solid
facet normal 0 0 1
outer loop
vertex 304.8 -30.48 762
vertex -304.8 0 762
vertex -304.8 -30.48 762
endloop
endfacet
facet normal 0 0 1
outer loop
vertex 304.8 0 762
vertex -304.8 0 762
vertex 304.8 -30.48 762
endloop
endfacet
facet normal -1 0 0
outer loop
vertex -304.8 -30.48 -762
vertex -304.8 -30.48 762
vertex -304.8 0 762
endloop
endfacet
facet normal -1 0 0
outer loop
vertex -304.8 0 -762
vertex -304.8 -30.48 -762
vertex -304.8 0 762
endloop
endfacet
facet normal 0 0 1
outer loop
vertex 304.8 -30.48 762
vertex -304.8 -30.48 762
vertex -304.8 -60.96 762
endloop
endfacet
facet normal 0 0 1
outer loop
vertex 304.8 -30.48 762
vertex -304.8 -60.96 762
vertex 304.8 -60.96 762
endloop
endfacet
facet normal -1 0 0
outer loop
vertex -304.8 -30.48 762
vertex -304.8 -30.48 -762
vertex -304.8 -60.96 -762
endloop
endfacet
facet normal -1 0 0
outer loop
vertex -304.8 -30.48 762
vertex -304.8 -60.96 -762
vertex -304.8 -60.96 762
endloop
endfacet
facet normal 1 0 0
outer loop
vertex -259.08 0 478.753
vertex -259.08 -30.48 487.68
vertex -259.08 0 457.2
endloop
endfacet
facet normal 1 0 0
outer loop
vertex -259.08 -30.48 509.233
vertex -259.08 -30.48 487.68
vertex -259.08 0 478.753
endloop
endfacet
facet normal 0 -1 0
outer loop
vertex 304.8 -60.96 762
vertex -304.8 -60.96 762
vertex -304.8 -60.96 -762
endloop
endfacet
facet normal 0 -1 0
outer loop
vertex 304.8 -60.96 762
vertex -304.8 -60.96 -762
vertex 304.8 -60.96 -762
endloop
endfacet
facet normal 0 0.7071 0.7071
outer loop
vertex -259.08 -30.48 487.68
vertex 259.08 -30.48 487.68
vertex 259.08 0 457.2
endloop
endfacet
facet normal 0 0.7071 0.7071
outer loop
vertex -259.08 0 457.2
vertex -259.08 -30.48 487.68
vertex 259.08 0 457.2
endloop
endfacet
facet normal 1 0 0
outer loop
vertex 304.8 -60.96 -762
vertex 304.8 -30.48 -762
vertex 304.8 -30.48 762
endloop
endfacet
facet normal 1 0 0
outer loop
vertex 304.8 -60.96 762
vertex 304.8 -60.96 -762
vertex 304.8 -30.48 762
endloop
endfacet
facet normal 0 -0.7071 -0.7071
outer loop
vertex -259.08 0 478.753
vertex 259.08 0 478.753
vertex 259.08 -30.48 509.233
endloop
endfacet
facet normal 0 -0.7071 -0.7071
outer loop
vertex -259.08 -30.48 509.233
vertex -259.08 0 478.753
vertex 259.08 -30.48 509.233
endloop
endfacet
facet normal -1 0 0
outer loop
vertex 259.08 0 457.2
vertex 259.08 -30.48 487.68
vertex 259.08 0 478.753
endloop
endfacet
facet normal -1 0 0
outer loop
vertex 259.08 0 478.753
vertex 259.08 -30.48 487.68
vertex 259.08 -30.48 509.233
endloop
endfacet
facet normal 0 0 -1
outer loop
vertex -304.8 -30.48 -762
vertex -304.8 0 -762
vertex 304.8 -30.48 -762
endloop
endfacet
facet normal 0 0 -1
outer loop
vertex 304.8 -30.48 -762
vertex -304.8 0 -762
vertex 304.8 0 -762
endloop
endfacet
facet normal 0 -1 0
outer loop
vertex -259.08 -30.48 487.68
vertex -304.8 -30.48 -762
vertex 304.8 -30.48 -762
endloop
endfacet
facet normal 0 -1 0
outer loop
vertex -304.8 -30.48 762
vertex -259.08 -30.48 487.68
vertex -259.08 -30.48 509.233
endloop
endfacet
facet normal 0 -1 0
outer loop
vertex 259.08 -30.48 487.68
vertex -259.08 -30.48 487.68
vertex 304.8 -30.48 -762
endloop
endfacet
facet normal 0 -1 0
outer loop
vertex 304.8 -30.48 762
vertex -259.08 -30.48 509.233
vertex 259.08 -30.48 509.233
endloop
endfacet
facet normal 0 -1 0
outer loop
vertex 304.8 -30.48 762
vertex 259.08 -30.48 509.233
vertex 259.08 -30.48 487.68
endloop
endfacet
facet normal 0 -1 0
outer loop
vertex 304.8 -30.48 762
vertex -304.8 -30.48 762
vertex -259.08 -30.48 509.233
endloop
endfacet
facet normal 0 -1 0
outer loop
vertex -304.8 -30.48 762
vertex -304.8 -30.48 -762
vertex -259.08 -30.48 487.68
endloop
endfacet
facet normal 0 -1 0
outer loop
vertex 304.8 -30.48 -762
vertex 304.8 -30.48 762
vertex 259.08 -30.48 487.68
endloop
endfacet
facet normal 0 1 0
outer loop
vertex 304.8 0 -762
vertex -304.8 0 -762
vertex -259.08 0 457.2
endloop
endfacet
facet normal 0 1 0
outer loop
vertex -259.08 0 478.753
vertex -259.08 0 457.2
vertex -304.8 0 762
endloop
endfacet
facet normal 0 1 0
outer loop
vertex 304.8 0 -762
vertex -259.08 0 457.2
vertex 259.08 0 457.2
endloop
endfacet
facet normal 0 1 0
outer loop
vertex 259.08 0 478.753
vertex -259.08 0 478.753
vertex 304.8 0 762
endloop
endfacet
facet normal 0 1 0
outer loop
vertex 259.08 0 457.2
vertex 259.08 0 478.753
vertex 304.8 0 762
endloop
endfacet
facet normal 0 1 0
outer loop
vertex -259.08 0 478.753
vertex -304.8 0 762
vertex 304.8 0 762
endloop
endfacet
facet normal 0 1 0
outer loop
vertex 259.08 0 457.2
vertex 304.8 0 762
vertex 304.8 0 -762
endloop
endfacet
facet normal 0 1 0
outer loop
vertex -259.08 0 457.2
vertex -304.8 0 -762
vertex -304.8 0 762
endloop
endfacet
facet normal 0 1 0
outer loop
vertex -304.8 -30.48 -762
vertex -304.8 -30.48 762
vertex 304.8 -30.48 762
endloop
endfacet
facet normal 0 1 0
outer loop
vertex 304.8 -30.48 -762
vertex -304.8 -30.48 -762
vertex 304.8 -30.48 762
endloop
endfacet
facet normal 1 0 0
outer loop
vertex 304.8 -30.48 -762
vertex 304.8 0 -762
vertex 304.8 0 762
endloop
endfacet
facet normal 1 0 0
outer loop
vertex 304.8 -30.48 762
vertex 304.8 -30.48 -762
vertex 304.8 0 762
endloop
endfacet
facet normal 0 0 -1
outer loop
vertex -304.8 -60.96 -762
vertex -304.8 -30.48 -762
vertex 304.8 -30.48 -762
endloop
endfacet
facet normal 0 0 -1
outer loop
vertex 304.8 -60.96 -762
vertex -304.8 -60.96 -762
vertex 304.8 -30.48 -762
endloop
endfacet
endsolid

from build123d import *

# Parameters (mm, degrees)
F0_W     = 609.6
F0_H     = 1524
F1_DEPTH = 30.48
F3_DEPTH = 609.6
F4_W     = 45.72
F4_H     = 30.48
F5_DEPTH = 609.6
F6_W     = 609.6
F6_H     = 1524
F7_DEPTH = 30.48


with BuildPart() as f1:
    # F0 (on Front) → F1 (new body)
    with BuildSketch(Plane.XZ):
        Rectangle(F0_W, F0_H)
    extrude(amount=F1_DEPTH)

    # F2 (on face) → F3 (cut)
    with BuildSketch(Plane.YZ.offset(304.8)):
        Polygon((-30.48, 487.68), (0, 457.2), (11.940295, 466.81232), (-36.499559, 515.252174), (-47.275866, 504.475866), align=None)
    extrude(amount=-F3_DEPTH, mode=Mode.SUBTRACT)

    # F4 (on face) → F5 (join)
    with BuildSketch(Plane.XY.offset(762)):
        with Locations((-281.94, -15.24)):
            Rectangle(F4_W, F4_H)
        with Locations((281.94, -15.24)):
            Rectangle(F4_W, F4_H)
    extrude(amount=-F5_DEPTH)


with BuildPart() as f7:
    # F6 (on face) → F7 (new body)
    with BuildSketch(Plane.XZ.offset(30.48)):
        Rectangle(F6_W, F6_H)
    extrude(amount=F7_DEPTH)


solid = Compound([f1.part, f7.part])
